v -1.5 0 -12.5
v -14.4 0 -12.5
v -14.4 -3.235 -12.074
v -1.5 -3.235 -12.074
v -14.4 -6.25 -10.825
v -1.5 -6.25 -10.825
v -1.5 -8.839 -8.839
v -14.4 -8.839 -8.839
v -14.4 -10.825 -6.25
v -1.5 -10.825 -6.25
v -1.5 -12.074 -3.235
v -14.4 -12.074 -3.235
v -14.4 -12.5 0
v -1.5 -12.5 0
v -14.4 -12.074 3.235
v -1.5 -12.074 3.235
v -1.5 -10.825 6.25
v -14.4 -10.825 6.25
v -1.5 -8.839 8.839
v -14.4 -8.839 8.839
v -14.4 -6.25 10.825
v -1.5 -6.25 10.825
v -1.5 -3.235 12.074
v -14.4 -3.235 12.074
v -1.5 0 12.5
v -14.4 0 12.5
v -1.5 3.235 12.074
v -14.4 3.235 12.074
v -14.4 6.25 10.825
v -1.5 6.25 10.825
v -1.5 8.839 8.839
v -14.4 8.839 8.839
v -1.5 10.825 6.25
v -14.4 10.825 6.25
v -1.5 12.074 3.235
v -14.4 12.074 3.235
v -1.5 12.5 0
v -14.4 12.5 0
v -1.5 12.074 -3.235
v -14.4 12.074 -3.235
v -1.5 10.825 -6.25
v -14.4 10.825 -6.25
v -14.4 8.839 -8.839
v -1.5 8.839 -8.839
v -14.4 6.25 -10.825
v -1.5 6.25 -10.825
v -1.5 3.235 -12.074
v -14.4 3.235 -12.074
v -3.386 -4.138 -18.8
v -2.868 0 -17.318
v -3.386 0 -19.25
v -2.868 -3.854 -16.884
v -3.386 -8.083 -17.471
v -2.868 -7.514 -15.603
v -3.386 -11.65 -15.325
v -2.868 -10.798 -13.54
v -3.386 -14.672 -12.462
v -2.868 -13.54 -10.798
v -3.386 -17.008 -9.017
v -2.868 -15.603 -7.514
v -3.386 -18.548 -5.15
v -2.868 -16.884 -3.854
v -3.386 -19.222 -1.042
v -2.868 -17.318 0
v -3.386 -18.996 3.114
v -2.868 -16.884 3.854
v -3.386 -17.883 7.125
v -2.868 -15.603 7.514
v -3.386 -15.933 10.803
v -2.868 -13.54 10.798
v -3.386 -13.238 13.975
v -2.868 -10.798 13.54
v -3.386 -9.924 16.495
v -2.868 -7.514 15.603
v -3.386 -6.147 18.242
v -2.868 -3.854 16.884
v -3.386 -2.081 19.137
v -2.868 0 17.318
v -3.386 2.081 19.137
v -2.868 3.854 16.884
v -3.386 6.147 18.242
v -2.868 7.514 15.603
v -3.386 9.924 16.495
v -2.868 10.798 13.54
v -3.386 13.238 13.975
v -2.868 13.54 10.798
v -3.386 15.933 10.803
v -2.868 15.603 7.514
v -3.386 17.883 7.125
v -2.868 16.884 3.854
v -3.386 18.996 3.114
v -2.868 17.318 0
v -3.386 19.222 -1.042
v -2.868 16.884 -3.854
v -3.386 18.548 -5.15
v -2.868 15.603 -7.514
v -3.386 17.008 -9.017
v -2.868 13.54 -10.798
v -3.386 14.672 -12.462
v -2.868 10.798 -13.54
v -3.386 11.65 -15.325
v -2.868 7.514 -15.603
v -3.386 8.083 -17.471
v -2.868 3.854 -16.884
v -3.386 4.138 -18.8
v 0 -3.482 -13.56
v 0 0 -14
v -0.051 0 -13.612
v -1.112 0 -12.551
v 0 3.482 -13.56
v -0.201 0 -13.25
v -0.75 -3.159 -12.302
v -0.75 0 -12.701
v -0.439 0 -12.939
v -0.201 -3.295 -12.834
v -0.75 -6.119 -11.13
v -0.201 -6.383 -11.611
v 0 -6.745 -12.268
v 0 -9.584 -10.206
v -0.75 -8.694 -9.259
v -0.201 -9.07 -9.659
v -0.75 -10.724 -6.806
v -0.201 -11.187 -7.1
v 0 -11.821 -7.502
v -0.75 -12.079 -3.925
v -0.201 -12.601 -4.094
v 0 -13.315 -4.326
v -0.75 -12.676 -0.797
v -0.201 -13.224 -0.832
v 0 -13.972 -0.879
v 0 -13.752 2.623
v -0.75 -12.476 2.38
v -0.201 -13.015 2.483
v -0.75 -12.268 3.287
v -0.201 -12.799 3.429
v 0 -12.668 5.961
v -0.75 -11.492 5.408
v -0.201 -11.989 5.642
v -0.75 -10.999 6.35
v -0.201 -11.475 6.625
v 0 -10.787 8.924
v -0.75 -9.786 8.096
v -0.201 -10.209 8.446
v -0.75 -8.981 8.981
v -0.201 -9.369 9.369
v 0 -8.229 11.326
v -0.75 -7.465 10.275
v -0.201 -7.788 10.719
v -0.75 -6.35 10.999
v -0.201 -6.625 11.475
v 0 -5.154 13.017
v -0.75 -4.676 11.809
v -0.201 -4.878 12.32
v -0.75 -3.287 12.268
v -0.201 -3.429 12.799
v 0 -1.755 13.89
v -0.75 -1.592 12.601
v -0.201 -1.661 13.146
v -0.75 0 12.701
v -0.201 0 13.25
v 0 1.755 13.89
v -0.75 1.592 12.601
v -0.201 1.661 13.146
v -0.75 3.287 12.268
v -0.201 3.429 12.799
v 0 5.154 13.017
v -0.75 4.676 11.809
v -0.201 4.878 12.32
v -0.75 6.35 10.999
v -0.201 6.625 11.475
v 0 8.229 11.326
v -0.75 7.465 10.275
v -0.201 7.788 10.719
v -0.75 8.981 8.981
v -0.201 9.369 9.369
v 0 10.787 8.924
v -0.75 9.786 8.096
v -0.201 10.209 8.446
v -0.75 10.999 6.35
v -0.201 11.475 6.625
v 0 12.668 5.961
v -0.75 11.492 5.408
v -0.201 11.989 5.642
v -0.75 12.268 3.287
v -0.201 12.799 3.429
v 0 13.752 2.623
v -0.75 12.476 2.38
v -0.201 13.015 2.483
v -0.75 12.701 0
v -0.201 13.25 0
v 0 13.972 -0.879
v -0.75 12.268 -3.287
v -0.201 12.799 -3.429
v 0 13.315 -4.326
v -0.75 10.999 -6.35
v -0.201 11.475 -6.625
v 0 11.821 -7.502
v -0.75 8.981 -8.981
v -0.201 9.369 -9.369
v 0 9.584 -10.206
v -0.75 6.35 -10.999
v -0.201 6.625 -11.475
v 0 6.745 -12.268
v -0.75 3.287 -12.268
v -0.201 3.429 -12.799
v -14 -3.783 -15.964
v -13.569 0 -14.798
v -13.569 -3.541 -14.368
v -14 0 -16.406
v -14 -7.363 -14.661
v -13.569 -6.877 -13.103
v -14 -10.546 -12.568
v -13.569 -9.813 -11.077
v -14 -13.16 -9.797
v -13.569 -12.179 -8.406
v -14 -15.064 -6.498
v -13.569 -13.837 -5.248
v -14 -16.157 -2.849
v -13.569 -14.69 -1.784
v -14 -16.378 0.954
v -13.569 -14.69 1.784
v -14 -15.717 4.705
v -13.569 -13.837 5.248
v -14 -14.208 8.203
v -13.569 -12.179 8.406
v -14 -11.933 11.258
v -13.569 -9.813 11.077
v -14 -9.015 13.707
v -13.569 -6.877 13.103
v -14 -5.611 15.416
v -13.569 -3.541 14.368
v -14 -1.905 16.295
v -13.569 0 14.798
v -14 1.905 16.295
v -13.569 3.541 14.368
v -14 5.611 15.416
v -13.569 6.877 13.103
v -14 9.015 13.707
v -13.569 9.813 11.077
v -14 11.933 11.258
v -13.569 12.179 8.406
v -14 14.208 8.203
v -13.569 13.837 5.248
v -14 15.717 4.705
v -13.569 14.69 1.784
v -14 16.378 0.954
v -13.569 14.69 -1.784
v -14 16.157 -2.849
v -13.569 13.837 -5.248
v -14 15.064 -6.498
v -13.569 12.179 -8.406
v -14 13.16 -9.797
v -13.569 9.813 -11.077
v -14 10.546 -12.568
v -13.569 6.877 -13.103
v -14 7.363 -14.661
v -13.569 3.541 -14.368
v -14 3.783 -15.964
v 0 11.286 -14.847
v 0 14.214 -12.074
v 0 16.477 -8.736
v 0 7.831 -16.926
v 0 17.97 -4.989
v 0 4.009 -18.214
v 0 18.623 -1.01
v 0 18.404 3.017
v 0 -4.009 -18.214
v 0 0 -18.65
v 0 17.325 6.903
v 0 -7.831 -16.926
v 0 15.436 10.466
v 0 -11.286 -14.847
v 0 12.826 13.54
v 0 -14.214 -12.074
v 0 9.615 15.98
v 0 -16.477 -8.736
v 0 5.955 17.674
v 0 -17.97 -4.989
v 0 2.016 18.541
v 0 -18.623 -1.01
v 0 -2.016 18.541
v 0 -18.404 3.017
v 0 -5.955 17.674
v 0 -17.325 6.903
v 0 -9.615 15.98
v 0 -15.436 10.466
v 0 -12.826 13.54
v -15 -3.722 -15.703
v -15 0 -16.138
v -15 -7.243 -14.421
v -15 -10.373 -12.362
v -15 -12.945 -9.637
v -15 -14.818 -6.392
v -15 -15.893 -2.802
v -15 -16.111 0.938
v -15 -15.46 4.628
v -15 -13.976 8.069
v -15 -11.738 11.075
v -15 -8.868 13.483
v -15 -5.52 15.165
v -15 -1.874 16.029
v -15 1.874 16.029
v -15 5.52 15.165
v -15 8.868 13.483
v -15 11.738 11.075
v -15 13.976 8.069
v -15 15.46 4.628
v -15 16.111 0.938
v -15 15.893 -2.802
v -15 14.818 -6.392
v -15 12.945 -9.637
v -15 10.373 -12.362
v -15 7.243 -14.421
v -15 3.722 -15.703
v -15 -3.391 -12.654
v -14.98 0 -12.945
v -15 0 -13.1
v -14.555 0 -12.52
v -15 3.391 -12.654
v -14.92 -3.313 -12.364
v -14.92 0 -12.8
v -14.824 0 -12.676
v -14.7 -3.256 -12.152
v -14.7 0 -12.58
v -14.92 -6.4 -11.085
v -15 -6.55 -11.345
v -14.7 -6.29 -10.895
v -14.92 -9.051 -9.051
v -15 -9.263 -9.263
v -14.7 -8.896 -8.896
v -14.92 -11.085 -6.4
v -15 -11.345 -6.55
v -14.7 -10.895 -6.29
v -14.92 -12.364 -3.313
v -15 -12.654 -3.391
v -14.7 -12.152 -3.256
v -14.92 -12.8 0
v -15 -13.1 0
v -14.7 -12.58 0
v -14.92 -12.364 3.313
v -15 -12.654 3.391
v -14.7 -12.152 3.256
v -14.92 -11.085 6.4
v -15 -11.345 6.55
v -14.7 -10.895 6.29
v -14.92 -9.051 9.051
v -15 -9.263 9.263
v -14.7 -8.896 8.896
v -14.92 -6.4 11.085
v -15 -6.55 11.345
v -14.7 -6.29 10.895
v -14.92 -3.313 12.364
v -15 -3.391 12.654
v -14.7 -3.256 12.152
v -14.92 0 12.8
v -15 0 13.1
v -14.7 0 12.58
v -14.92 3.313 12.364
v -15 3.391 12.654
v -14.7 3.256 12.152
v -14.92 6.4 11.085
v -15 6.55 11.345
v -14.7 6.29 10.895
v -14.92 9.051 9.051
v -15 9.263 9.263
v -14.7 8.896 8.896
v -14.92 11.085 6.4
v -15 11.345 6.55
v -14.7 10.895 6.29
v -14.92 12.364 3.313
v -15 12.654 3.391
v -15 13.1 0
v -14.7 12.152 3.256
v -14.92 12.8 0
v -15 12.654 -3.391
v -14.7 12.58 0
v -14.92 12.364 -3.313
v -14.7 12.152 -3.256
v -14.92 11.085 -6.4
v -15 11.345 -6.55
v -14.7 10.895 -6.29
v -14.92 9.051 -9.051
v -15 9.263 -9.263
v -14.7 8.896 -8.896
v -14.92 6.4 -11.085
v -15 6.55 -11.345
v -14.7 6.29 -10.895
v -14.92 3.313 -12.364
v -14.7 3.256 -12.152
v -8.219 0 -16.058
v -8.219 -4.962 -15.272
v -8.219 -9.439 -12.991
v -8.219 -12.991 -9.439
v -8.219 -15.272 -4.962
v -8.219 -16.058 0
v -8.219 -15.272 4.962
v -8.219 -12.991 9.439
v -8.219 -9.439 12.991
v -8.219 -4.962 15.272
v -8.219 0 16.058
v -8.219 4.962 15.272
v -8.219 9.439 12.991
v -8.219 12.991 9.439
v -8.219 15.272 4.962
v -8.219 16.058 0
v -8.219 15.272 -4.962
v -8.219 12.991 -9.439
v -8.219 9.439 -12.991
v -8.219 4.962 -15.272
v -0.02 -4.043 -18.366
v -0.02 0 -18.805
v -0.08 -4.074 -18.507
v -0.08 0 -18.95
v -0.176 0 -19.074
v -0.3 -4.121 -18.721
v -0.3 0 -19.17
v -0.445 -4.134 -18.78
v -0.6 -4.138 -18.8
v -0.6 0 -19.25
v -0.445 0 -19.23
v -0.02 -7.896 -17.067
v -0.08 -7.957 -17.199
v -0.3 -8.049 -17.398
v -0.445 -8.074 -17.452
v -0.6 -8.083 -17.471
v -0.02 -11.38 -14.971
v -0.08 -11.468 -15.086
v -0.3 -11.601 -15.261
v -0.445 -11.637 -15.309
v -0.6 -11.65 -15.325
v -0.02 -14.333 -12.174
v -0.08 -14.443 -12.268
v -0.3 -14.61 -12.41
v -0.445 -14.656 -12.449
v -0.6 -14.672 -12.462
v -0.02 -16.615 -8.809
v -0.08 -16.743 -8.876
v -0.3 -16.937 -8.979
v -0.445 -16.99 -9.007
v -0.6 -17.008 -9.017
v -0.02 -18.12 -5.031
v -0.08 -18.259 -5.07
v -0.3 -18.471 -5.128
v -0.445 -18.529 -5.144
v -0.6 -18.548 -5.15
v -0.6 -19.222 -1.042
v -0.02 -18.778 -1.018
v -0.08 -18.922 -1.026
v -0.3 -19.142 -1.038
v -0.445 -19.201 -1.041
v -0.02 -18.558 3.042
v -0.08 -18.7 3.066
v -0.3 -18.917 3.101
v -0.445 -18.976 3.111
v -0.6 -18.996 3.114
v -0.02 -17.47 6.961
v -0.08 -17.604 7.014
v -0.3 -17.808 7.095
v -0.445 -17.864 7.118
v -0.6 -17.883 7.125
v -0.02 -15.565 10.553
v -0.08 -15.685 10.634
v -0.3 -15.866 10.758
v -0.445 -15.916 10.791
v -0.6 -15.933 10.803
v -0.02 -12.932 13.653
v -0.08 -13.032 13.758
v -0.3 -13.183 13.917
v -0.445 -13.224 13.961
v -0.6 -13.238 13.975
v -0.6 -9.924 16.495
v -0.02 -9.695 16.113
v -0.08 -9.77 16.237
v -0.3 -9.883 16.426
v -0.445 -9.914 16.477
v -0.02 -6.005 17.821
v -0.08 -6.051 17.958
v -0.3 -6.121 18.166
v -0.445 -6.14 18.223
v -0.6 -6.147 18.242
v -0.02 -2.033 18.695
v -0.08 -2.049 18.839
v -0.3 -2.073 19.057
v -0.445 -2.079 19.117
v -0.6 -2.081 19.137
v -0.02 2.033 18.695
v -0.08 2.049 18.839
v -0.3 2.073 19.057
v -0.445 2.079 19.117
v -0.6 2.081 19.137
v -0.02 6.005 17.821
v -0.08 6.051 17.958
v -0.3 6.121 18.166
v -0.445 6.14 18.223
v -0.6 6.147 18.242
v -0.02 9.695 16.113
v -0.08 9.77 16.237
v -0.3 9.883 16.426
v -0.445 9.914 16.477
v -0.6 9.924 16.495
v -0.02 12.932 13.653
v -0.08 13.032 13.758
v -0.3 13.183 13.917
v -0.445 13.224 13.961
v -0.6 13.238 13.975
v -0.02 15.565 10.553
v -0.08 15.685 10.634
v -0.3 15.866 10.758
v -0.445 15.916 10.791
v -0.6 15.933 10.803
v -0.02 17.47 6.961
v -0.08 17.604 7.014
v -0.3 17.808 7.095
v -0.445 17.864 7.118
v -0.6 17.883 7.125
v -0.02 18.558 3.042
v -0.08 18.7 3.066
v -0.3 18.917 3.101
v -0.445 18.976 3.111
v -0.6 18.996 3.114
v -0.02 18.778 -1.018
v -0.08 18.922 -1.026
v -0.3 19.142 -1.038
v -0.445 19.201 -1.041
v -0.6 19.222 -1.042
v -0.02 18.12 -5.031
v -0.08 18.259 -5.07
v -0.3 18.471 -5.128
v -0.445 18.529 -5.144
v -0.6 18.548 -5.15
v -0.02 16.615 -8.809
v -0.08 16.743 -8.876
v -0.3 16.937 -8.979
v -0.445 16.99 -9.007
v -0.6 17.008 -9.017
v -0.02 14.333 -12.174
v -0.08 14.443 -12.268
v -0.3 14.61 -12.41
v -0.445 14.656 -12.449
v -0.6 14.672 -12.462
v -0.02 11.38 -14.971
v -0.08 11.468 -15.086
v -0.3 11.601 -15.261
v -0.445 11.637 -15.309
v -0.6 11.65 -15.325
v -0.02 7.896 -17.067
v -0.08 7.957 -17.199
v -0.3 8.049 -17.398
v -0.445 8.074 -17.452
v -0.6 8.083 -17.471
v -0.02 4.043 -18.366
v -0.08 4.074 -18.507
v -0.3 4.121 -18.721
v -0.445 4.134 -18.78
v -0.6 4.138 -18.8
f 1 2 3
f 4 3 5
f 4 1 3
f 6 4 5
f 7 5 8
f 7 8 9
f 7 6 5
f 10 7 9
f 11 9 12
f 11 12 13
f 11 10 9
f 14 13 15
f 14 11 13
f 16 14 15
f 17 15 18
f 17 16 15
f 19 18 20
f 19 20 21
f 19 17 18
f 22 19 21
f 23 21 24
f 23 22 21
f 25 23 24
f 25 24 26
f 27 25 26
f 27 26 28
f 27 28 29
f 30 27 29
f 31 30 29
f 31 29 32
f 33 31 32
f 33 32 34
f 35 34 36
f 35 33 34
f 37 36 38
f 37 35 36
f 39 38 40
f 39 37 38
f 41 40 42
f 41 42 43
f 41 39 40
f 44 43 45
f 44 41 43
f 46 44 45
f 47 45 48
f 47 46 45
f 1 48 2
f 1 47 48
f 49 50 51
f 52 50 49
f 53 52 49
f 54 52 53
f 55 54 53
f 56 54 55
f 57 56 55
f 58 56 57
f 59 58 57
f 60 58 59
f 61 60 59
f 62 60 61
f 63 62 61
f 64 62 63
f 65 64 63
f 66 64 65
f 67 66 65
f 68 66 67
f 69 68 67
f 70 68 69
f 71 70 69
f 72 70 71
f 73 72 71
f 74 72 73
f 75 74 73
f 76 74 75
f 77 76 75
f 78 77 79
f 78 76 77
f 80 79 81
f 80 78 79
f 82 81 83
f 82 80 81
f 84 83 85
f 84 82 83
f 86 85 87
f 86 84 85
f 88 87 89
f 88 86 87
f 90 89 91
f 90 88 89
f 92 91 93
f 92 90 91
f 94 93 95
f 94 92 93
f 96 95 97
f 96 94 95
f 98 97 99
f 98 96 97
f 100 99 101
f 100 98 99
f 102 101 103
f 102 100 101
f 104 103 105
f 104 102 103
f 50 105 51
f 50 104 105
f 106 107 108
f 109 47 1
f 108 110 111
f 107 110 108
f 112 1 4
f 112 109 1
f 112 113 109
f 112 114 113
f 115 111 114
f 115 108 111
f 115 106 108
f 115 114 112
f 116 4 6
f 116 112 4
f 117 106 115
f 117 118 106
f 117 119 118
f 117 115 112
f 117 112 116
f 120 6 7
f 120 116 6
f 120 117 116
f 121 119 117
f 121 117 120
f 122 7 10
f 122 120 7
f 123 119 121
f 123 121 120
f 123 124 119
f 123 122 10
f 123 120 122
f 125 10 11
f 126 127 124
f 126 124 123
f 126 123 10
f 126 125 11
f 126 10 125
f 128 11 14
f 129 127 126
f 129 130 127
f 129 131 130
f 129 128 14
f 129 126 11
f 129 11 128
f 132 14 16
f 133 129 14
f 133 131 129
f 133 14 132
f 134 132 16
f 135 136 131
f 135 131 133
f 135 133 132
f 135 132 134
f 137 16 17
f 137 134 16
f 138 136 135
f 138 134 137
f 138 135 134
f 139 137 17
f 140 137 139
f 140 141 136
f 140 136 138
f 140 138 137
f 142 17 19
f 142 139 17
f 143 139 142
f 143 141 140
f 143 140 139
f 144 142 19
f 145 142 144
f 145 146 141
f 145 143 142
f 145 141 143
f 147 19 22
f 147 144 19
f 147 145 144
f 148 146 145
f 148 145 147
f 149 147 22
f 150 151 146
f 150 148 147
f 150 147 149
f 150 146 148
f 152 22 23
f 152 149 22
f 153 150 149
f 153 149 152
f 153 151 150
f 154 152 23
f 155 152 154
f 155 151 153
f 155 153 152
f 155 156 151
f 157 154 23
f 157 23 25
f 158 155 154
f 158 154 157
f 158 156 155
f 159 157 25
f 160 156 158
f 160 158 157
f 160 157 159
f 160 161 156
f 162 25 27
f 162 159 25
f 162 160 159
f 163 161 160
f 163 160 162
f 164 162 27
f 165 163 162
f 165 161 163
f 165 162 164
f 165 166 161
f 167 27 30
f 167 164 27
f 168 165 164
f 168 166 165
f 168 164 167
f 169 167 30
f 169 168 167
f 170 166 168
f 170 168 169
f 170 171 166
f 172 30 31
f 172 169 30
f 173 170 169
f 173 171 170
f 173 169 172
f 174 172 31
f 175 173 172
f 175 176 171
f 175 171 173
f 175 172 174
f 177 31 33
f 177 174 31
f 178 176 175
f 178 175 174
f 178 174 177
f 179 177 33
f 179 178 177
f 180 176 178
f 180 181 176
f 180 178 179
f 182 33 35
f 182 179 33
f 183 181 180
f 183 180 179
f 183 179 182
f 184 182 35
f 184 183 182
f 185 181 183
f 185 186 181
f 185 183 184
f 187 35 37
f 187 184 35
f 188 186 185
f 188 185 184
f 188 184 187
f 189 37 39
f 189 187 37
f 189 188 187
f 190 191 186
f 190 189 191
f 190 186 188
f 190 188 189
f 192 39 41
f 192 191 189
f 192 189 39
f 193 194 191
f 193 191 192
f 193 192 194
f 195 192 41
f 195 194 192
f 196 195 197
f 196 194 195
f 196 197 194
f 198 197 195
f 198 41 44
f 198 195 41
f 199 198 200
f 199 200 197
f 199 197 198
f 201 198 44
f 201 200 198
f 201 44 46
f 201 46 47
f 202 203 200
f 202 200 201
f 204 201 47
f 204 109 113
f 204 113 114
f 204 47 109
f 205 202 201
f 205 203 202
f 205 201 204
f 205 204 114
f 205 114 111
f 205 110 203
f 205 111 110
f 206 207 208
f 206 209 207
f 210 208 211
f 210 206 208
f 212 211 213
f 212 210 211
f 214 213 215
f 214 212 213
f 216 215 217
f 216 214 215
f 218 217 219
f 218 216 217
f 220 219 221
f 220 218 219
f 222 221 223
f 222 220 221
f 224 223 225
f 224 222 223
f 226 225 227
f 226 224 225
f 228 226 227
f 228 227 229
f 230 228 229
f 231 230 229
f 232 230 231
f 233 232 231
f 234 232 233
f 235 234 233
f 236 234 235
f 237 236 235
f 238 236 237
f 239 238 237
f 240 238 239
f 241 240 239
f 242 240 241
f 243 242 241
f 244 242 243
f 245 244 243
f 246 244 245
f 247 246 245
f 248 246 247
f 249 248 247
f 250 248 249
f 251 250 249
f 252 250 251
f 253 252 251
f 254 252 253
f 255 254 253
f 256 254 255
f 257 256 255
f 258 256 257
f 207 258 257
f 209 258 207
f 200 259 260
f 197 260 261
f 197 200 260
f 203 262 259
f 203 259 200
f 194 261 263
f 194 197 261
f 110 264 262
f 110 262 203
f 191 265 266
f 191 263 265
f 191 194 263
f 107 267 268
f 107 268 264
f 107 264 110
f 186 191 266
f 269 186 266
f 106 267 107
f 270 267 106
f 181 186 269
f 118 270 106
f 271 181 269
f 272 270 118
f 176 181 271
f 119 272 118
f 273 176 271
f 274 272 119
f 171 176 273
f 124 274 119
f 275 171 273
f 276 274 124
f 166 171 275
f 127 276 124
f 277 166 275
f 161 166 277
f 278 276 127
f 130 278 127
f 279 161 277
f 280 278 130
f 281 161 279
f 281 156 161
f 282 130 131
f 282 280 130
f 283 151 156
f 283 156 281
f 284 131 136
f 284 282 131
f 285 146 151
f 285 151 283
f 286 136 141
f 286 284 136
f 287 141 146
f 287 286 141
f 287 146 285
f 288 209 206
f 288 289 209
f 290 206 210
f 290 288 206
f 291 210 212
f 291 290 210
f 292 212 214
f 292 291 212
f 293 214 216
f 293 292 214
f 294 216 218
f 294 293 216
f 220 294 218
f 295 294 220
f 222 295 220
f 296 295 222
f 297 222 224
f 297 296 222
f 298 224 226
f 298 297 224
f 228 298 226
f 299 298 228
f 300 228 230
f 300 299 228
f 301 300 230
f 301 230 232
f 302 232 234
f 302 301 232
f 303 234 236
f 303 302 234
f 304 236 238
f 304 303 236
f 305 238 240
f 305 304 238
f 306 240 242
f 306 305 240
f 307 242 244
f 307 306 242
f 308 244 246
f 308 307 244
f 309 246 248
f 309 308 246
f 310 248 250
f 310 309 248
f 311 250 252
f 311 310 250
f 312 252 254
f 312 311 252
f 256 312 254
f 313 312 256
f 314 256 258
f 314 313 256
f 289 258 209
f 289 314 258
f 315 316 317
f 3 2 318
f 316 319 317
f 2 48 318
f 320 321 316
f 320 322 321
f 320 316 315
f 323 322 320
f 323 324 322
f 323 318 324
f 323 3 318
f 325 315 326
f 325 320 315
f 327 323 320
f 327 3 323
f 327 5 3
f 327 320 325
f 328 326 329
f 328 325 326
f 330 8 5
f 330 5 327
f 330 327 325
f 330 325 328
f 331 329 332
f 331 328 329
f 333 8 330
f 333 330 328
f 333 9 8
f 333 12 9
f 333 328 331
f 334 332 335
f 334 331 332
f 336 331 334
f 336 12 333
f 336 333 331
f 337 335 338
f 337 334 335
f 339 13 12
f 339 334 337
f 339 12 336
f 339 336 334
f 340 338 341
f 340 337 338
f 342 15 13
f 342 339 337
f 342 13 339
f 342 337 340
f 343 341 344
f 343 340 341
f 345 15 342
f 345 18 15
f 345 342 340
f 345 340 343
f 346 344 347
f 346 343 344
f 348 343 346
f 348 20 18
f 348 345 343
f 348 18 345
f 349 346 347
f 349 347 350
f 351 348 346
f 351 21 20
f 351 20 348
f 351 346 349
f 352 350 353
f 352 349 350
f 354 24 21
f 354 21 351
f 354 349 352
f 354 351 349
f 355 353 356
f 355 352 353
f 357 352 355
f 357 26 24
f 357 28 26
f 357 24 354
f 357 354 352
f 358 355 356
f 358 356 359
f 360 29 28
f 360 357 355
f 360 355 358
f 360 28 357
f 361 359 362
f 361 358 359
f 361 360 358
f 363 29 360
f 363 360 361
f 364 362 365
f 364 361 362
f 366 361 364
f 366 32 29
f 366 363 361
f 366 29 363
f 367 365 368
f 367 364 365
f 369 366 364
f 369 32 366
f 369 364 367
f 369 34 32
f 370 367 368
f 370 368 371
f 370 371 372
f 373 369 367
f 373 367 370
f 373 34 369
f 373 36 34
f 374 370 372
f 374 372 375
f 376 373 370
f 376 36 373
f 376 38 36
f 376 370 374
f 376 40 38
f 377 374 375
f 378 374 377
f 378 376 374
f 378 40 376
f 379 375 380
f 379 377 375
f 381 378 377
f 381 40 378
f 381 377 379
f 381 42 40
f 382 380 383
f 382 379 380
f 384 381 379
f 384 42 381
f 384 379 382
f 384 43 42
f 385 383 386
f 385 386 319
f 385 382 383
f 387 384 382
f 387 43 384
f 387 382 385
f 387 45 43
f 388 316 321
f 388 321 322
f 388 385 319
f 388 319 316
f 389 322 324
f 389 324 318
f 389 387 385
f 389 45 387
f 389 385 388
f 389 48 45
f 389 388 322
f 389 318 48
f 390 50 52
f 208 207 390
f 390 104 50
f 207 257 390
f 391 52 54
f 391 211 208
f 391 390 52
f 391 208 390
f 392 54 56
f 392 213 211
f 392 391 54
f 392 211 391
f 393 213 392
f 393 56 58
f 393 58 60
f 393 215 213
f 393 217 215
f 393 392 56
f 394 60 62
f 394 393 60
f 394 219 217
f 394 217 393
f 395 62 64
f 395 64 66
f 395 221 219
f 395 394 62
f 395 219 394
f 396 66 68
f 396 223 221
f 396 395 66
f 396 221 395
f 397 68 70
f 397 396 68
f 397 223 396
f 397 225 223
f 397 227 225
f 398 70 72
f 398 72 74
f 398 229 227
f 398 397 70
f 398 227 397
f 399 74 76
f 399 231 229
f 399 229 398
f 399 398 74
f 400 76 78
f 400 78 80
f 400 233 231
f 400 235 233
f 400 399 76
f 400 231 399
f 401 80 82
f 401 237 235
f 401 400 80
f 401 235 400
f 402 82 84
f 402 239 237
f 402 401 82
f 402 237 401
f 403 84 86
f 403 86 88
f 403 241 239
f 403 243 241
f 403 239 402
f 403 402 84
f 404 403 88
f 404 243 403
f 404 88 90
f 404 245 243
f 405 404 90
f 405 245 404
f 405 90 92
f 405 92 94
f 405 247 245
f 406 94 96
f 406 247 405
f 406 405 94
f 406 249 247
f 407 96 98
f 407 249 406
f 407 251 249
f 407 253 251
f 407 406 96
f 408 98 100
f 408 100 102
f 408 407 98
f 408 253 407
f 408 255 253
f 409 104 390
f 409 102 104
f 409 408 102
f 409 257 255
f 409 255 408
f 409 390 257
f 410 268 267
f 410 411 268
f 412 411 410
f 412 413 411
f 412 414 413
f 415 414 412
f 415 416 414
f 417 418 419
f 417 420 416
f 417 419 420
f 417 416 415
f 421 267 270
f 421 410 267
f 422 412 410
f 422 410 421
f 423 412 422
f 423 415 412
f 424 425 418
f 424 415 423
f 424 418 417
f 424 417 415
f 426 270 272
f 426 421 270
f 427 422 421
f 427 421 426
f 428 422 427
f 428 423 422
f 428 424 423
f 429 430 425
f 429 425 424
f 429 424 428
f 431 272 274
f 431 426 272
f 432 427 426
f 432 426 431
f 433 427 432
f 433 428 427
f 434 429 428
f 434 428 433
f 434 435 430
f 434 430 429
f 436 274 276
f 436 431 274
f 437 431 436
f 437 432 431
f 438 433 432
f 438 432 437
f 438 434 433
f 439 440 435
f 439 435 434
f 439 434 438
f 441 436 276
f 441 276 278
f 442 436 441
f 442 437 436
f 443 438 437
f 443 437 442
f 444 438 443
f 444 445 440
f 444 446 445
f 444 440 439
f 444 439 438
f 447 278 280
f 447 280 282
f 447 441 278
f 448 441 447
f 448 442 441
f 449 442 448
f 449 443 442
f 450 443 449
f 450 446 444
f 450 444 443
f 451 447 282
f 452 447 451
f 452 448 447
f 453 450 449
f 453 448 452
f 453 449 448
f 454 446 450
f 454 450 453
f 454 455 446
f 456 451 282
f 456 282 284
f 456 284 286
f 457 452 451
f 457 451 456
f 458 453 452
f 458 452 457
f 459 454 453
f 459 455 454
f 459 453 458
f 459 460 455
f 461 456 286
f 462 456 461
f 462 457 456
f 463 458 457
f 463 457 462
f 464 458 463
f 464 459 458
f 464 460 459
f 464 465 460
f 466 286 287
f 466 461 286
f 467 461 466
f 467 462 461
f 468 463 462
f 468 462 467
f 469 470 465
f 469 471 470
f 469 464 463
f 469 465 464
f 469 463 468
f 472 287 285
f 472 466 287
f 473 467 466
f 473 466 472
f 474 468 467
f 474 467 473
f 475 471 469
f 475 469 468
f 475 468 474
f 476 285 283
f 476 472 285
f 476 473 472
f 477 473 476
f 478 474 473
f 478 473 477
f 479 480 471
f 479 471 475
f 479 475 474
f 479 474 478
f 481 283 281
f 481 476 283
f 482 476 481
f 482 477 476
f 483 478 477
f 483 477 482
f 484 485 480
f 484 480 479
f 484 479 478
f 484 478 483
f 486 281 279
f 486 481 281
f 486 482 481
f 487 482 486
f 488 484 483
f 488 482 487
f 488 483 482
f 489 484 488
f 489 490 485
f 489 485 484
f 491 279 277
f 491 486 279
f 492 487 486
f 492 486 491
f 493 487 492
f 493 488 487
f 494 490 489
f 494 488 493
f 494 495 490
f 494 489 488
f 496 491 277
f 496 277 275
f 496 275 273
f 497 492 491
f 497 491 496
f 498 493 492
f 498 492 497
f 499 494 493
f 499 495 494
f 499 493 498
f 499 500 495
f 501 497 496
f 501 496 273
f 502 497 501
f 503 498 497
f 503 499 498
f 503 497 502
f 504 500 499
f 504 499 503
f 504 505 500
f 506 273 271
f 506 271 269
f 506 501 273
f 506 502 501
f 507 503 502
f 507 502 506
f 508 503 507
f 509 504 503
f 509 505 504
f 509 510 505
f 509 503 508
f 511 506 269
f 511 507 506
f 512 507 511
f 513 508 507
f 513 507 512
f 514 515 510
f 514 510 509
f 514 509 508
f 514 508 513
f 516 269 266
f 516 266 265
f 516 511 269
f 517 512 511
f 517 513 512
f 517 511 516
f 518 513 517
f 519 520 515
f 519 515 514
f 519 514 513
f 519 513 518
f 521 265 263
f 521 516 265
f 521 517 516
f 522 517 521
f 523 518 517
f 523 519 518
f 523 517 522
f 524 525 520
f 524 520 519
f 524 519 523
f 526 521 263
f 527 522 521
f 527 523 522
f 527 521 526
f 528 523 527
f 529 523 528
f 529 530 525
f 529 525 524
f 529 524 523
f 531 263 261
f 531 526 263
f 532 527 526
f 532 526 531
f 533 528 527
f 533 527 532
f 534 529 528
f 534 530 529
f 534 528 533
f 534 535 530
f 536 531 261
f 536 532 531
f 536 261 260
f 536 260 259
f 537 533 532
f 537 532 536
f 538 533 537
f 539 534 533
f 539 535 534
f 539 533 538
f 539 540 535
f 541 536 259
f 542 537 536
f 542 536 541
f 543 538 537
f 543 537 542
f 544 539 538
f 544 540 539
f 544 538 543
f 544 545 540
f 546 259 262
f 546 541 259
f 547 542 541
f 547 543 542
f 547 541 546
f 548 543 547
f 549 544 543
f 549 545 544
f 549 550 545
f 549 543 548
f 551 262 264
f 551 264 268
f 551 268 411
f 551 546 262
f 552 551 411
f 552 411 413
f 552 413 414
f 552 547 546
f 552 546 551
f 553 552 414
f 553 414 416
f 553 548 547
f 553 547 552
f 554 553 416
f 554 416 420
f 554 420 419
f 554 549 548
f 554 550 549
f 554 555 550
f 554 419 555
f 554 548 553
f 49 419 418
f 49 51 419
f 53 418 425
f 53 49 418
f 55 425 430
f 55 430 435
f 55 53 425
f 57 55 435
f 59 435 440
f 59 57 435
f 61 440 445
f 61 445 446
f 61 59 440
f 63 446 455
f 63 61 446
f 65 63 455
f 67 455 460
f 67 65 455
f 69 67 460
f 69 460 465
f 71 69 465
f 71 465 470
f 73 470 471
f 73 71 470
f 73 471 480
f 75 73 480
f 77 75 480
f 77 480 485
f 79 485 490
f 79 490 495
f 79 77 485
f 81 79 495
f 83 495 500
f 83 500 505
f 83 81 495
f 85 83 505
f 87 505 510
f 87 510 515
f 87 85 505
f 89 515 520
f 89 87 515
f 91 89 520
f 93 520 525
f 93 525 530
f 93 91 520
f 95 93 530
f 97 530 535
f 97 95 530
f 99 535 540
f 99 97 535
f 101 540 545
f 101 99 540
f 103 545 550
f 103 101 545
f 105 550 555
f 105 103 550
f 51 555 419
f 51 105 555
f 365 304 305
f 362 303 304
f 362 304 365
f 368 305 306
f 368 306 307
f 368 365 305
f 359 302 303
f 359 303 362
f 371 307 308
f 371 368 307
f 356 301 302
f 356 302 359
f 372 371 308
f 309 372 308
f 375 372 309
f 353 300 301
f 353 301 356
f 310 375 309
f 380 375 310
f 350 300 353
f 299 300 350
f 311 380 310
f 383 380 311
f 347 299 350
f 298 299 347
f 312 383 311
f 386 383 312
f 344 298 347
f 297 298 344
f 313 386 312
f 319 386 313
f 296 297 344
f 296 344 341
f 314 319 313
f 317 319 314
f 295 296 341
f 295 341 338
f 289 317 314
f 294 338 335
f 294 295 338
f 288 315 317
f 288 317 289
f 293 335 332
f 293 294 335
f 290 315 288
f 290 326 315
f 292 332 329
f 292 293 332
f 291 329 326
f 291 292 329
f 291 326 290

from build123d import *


with BuildPart() as part:
    # Esquisse1 → Base-Révolution (revolve)
    with BuildSketch(Plane.XY, mode=Mode.PRIVATE) as base_r_volution_sk:
        with BuildLine():
            Line((0, 14), (0, 18.65))
            ThreePointArc((0, 18.65), (-0.175735931, 19.074264069), (-0.6, 19.25))
            Line((-0.6, 19.25), (-3.385649604, 19.25))
            Line((-3.385649604, 19.25), (-2.868011513, 17.318148347))
            Line((-2.868011513, 17.318148347), (-13.569257226, 14.798339466))
            Line((-13.569257226, 14.798339466), (-14, 16.405893383))
            Line((-14, 16.405893383), (-15, 16.137944191))
            Line((-15, 16.137944191), (-15, 13.1))
            ThreePointArc((-15, 13.1), (-14.824264069, 12.675735931), (-14.4, 12.5))
            Line((-14.4, 12.5), (-1.5, 12.5))
            ThreePointArc((-1.5, 12.5), (-0.439339828, 12.939339828), (0, 14))
        make_face()
    revolve(base_r_volution_sk.sketch.rotate(Axis((0, 0, 0), (-1, 0, 0)), 90), axis=Axis((0, 0, 0), (-1, 0, 0)))


solid = part.part
